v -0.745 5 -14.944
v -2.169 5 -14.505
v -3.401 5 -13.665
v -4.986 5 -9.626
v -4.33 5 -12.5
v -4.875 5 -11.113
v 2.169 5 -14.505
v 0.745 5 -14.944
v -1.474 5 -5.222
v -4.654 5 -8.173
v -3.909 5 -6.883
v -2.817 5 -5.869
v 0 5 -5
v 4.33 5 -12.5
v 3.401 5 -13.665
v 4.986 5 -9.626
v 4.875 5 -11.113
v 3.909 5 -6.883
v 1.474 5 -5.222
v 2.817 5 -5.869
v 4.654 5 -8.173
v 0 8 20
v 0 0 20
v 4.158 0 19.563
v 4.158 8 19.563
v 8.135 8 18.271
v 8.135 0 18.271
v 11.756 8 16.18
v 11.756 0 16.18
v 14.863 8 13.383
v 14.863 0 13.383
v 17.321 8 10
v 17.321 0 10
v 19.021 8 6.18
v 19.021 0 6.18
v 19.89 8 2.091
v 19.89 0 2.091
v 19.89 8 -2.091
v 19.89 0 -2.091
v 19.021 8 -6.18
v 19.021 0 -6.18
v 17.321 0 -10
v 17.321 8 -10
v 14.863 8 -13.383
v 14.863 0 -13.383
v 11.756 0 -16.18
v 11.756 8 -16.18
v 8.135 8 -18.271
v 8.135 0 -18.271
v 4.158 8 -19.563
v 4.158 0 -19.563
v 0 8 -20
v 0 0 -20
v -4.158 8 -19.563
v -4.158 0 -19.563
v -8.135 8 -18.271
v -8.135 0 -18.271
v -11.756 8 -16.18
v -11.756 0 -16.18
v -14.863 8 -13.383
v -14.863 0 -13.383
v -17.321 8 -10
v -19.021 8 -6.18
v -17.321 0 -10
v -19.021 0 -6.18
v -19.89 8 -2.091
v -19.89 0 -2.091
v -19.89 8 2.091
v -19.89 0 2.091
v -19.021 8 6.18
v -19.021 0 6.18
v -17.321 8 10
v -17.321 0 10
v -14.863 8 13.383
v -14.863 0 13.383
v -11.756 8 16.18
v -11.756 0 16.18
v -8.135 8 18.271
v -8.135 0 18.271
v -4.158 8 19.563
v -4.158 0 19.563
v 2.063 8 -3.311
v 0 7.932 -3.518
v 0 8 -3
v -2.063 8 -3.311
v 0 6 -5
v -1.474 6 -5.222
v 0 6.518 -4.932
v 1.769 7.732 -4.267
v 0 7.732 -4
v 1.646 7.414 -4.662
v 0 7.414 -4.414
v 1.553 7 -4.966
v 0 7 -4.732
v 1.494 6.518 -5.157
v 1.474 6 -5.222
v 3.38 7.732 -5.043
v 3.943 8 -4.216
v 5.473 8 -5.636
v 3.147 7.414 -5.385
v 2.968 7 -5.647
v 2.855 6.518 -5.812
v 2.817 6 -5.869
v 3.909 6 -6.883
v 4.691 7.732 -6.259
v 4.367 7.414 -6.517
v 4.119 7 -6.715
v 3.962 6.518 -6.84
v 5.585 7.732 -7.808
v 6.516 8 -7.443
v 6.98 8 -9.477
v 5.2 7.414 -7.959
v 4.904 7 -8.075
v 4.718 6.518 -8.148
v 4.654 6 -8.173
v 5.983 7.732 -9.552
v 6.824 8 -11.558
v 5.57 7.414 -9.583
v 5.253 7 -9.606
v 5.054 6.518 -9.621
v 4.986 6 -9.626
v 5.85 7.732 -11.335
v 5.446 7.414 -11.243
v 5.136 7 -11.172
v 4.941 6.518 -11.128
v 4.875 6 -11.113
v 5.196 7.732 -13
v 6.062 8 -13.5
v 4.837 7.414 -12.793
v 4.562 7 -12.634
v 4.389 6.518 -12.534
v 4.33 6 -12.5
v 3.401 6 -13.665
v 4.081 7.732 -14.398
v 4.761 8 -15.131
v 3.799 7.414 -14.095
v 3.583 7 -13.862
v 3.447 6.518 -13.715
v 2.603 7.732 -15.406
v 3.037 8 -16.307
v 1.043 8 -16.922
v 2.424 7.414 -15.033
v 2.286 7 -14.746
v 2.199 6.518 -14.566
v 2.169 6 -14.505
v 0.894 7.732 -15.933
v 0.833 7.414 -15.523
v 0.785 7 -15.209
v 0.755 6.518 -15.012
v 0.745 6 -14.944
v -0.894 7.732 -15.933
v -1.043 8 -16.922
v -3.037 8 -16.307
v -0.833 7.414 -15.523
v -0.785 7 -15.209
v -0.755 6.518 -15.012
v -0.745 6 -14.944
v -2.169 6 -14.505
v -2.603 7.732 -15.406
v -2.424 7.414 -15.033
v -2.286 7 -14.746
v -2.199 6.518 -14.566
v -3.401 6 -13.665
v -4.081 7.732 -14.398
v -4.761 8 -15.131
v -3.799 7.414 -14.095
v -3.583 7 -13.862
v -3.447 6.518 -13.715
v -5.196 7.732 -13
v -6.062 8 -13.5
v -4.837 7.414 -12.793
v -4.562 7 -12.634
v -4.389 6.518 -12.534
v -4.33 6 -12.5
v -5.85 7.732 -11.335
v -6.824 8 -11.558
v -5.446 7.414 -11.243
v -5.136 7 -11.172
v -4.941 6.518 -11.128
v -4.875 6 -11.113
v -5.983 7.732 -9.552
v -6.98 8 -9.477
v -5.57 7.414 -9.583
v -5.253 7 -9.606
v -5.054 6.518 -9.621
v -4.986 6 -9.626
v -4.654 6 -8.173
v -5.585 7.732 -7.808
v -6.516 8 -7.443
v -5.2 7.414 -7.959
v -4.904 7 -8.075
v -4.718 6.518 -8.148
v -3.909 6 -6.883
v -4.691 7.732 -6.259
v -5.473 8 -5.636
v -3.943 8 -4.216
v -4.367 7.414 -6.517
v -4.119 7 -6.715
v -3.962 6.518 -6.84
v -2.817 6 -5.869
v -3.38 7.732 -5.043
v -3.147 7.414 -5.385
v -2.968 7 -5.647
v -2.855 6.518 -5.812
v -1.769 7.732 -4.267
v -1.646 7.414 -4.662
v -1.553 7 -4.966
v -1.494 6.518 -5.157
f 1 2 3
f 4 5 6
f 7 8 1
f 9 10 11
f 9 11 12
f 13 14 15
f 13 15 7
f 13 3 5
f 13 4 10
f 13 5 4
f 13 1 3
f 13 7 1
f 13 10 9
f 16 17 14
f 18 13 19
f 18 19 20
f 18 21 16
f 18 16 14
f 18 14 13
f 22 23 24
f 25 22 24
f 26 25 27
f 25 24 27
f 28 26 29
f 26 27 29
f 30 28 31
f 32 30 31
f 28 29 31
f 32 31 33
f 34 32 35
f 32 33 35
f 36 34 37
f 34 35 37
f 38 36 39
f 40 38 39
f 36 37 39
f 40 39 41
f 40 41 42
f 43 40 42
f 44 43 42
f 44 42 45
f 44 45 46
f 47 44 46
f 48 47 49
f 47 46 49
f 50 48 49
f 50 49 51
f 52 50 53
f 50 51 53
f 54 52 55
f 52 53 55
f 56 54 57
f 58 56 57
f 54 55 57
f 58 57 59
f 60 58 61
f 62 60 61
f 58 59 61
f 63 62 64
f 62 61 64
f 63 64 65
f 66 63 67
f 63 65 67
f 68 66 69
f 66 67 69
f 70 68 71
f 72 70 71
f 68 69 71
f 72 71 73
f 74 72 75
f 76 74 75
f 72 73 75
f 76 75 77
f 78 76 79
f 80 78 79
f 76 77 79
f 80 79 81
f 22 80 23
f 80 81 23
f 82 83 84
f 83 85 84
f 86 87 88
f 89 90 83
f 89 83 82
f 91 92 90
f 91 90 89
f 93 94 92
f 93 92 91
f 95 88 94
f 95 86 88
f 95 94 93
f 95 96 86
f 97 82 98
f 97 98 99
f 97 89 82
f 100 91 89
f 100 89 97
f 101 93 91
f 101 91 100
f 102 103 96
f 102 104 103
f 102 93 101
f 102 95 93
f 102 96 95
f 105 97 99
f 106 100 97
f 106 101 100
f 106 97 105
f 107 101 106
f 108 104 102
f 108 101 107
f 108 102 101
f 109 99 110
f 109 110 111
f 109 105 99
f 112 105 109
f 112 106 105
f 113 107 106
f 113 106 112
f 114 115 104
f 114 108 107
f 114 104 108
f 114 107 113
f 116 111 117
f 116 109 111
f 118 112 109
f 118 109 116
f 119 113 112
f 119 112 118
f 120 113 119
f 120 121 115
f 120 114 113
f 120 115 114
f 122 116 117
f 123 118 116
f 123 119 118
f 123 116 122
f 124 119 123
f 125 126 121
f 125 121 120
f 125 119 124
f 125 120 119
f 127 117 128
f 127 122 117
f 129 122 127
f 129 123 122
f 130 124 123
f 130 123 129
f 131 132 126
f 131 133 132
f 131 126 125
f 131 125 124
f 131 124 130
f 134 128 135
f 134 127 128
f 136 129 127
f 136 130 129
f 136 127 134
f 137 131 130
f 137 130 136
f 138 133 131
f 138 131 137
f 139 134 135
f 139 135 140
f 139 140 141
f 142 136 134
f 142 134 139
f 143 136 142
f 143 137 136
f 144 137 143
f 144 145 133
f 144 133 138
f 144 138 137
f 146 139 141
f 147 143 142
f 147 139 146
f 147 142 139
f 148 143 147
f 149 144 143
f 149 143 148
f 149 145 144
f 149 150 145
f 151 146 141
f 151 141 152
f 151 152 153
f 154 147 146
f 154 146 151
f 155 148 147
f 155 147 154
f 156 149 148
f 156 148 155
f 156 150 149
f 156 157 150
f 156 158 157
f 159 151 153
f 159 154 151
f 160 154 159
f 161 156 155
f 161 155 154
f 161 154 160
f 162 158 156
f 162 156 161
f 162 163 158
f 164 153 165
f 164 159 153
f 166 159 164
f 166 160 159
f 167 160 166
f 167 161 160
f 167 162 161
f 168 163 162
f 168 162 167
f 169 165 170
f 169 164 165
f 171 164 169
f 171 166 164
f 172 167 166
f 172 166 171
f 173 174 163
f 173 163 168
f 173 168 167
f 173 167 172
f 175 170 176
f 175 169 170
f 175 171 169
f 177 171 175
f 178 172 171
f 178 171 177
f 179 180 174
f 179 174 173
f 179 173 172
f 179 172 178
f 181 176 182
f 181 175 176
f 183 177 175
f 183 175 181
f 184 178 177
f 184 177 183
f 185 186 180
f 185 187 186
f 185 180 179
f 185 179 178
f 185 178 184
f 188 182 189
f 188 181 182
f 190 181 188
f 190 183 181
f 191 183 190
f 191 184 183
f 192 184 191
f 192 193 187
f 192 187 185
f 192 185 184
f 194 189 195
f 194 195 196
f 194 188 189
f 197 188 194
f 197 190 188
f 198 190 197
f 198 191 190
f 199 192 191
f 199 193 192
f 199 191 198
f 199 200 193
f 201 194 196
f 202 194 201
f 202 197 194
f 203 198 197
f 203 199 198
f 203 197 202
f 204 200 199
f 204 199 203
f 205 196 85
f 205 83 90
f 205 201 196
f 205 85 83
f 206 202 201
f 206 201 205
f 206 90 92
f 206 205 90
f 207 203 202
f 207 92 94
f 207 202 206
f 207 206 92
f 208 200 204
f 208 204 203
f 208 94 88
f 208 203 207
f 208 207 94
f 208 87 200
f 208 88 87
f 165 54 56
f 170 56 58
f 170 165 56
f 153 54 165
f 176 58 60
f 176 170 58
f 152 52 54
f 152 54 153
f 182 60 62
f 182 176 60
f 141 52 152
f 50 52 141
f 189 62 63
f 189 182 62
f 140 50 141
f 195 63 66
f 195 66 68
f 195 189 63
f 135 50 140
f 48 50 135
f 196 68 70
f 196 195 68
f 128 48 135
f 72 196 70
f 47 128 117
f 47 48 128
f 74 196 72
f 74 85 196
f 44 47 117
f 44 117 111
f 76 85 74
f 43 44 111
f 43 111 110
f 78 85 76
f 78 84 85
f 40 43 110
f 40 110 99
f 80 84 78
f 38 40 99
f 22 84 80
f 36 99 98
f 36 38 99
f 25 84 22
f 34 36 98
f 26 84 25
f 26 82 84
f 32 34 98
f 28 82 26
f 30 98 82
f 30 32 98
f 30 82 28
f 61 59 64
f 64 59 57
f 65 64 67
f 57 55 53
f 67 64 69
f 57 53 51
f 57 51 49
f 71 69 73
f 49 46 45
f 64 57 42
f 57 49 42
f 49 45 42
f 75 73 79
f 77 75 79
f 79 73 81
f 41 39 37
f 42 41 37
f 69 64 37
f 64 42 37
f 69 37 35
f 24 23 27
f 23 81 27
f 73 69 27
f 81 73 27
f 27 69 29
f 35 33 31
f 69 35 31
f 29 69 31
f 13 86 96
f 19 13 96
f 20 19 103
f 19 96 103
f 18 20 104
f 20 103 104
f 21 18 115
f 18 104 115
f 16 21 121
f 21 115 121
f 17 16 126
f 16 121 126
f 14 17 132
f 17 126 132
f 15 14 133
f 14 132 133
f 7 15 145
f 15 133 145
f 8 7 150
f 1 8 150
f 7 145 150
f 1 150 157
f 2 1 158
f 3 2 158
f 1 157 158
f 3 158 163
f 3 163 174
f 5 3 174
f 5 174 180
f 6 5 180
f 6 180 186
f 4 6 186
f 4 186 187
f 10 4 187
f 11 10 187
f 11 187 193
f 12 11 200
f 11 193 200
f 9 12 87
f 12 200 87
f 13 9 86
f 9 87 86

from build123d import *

# Parameters (mm, degrees)
CROQUIS1_R              = 20
SALIENTE_EXTRUIR1_DEPTH = 8
CROQUIS2_R              = 5
CORTAR_EXTRUIR1_DEPTH   = 3
REDONDEO1_R             = 2


with BuildPart() as part:
    # Croquis1 → Saliente-Extruir1 (new body)
    with BuildSketch(Plane(origin=(0, 0, 0), x_dir=(1, 0, 0), z_dir=(0, 1, 0))):
        with Locations(Location((0, 0, 0), (0, 0, 270))):
            Circle(CROQUIS1_R)
    extrude(amount=SALIENTE_EXTRUIR1_DEPTH)

    # Croquis2 → Cortar-Extruir1 (cut)
    with BuildSketch(Plane(origin=(0, 8, 0), x_dir=(1, 0, 0), z_dir=(0, 1, 0))):
        with Locations(Location((0, 10, 0), (0, 0, 270))):
            Circle(CROQUIS2_R)
    extrude(amount=-CORTAR_EXTRUIR1_DEPTH, mode=Mode.SUBTRACT)

    # Redondeo1
    redondeo1_edges = [part.edges().sort_by_distance(p)[0] for p in [
        (0, 8, -15),
    ]]
    fillet(redondeo1_edges, radius=REDONDEO1_R)


solid = part.part
